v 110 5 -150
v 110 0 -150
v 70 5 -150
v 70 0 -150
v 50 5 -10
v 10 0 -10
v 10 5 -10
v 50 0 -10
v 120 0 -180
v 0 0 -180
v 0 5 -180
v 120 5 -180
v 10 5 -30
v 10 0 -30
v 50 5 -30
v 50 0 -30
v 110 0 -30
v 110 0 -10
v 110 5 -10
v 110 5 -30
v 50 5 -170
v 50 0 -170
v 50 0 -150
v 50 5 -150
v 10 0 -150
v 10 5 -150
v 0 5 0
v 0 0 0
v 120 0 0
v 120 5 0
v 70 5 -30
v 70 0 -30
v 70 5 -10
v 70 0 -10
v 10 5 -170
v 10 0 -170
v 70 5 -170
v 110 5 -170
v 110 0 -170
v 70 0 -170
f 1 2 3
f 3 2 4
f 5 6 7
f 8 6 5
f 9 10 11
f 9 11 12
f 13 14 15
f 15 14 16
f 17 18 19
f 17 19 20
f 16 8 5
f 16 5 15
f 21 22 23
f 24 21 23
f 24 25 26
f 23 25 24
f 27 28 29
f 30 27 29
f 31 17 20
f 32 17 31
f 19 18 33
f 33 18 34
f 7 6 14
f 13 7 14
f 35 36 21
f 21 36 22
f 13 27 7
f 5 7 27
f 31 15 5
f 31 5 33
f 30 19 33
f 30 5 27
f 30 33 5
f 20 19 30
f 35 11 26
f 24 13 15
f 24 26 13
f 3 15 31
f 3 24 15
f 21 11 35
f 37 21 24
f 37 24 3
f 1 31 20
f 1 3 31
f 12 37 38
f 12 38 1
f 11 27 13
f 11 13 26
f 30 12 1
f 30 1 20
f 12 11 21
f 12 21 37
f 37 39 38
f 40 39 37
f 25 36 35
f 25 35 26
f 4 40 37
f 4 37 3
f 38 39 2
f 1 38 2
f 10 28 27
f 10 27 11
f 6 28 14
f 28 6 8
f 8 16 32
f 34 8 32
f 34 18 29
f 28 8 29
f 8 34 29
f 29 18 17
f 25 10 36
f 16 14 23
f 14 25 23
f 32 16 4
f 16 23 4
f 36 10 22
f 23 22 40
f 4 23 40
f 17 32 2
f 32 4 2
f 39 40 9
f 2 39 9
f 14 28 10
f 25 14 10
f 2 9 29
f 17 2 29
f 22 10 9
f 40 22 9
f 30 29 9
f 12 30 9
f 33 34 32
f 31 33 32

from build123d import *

# Parameters (mm, degrees)
SKETCH1_W               = 120
SKETCH1_H               = 180
BOSS_EXTRUDE1_DEPTH     = 5
SKETCH3_W               = 40
SKETCH3_H               = 20
CUT_EXTRUDE2_DEPTH      = 5
MIRROR2_COPY_1_SKETCH_W = 40
MIRROR2_COPY_1_SKETCH_H = 20
MIRROR2_COPY_1_DEPTH    = 5


with BuildPart() as part:
    # Sketch1 → Boss-Extrude1 (new body)
    with BuildSketch(Plane(origin=(0, 0, 0), x_dir=(1, 0, 0), z_dir=(0, 1, 0))):
        with Locations((60, 90)):
            Rectangle(SKETCH1_W, SKETCH1_H)
    extrude(amount=BOSS_EXTRUDE1_DEPTH)

    # Sketch3 → Cut-Extrude2 (cut)
    with BuildSketch(Plane.XZ):
        with Locations((30, -160)):
            Rectangle(SKETCH3_W, SKETCH3_H)
    cut_extrude2 = extrude(amount=-CUT_EXTRUDE2_DEPTH, mode=Mode.SUBTRACT)

    # Mirror1: Cut-Extrude2 across plane
    add(cut_extrude2.mirror(Plane.ZY.offset(-60)), mode=Mode.SUBTRACT)

    # Mirror2: Cut-Extrude2 across plane
    add(cut_extrude2.mirror(Plane(origin=(0, 0, -90), x_dir=(1, 0, 0), z_dir=(0, 0, -1))), mode=Mode.SUBTRACT)

    # Mirror2 copy 1 sketch → Mirror2 copy 1 (cut)
    with BuildSketch(Plane(origin=(120, 0, -180), x_dir=(-1, 0, 0), z_dir=(0, -1, 0))):
        with Locations((30, -160)):
            Rectangle(MIRROR2_COPY_1_SKETCH_W, MIRROR2_COPY_1_SKETCH_H)
    extrude(amount=-MIRROR2_COPY_1_DEPTH, mode=Mode.SUBTRACT)


solid = part.part
